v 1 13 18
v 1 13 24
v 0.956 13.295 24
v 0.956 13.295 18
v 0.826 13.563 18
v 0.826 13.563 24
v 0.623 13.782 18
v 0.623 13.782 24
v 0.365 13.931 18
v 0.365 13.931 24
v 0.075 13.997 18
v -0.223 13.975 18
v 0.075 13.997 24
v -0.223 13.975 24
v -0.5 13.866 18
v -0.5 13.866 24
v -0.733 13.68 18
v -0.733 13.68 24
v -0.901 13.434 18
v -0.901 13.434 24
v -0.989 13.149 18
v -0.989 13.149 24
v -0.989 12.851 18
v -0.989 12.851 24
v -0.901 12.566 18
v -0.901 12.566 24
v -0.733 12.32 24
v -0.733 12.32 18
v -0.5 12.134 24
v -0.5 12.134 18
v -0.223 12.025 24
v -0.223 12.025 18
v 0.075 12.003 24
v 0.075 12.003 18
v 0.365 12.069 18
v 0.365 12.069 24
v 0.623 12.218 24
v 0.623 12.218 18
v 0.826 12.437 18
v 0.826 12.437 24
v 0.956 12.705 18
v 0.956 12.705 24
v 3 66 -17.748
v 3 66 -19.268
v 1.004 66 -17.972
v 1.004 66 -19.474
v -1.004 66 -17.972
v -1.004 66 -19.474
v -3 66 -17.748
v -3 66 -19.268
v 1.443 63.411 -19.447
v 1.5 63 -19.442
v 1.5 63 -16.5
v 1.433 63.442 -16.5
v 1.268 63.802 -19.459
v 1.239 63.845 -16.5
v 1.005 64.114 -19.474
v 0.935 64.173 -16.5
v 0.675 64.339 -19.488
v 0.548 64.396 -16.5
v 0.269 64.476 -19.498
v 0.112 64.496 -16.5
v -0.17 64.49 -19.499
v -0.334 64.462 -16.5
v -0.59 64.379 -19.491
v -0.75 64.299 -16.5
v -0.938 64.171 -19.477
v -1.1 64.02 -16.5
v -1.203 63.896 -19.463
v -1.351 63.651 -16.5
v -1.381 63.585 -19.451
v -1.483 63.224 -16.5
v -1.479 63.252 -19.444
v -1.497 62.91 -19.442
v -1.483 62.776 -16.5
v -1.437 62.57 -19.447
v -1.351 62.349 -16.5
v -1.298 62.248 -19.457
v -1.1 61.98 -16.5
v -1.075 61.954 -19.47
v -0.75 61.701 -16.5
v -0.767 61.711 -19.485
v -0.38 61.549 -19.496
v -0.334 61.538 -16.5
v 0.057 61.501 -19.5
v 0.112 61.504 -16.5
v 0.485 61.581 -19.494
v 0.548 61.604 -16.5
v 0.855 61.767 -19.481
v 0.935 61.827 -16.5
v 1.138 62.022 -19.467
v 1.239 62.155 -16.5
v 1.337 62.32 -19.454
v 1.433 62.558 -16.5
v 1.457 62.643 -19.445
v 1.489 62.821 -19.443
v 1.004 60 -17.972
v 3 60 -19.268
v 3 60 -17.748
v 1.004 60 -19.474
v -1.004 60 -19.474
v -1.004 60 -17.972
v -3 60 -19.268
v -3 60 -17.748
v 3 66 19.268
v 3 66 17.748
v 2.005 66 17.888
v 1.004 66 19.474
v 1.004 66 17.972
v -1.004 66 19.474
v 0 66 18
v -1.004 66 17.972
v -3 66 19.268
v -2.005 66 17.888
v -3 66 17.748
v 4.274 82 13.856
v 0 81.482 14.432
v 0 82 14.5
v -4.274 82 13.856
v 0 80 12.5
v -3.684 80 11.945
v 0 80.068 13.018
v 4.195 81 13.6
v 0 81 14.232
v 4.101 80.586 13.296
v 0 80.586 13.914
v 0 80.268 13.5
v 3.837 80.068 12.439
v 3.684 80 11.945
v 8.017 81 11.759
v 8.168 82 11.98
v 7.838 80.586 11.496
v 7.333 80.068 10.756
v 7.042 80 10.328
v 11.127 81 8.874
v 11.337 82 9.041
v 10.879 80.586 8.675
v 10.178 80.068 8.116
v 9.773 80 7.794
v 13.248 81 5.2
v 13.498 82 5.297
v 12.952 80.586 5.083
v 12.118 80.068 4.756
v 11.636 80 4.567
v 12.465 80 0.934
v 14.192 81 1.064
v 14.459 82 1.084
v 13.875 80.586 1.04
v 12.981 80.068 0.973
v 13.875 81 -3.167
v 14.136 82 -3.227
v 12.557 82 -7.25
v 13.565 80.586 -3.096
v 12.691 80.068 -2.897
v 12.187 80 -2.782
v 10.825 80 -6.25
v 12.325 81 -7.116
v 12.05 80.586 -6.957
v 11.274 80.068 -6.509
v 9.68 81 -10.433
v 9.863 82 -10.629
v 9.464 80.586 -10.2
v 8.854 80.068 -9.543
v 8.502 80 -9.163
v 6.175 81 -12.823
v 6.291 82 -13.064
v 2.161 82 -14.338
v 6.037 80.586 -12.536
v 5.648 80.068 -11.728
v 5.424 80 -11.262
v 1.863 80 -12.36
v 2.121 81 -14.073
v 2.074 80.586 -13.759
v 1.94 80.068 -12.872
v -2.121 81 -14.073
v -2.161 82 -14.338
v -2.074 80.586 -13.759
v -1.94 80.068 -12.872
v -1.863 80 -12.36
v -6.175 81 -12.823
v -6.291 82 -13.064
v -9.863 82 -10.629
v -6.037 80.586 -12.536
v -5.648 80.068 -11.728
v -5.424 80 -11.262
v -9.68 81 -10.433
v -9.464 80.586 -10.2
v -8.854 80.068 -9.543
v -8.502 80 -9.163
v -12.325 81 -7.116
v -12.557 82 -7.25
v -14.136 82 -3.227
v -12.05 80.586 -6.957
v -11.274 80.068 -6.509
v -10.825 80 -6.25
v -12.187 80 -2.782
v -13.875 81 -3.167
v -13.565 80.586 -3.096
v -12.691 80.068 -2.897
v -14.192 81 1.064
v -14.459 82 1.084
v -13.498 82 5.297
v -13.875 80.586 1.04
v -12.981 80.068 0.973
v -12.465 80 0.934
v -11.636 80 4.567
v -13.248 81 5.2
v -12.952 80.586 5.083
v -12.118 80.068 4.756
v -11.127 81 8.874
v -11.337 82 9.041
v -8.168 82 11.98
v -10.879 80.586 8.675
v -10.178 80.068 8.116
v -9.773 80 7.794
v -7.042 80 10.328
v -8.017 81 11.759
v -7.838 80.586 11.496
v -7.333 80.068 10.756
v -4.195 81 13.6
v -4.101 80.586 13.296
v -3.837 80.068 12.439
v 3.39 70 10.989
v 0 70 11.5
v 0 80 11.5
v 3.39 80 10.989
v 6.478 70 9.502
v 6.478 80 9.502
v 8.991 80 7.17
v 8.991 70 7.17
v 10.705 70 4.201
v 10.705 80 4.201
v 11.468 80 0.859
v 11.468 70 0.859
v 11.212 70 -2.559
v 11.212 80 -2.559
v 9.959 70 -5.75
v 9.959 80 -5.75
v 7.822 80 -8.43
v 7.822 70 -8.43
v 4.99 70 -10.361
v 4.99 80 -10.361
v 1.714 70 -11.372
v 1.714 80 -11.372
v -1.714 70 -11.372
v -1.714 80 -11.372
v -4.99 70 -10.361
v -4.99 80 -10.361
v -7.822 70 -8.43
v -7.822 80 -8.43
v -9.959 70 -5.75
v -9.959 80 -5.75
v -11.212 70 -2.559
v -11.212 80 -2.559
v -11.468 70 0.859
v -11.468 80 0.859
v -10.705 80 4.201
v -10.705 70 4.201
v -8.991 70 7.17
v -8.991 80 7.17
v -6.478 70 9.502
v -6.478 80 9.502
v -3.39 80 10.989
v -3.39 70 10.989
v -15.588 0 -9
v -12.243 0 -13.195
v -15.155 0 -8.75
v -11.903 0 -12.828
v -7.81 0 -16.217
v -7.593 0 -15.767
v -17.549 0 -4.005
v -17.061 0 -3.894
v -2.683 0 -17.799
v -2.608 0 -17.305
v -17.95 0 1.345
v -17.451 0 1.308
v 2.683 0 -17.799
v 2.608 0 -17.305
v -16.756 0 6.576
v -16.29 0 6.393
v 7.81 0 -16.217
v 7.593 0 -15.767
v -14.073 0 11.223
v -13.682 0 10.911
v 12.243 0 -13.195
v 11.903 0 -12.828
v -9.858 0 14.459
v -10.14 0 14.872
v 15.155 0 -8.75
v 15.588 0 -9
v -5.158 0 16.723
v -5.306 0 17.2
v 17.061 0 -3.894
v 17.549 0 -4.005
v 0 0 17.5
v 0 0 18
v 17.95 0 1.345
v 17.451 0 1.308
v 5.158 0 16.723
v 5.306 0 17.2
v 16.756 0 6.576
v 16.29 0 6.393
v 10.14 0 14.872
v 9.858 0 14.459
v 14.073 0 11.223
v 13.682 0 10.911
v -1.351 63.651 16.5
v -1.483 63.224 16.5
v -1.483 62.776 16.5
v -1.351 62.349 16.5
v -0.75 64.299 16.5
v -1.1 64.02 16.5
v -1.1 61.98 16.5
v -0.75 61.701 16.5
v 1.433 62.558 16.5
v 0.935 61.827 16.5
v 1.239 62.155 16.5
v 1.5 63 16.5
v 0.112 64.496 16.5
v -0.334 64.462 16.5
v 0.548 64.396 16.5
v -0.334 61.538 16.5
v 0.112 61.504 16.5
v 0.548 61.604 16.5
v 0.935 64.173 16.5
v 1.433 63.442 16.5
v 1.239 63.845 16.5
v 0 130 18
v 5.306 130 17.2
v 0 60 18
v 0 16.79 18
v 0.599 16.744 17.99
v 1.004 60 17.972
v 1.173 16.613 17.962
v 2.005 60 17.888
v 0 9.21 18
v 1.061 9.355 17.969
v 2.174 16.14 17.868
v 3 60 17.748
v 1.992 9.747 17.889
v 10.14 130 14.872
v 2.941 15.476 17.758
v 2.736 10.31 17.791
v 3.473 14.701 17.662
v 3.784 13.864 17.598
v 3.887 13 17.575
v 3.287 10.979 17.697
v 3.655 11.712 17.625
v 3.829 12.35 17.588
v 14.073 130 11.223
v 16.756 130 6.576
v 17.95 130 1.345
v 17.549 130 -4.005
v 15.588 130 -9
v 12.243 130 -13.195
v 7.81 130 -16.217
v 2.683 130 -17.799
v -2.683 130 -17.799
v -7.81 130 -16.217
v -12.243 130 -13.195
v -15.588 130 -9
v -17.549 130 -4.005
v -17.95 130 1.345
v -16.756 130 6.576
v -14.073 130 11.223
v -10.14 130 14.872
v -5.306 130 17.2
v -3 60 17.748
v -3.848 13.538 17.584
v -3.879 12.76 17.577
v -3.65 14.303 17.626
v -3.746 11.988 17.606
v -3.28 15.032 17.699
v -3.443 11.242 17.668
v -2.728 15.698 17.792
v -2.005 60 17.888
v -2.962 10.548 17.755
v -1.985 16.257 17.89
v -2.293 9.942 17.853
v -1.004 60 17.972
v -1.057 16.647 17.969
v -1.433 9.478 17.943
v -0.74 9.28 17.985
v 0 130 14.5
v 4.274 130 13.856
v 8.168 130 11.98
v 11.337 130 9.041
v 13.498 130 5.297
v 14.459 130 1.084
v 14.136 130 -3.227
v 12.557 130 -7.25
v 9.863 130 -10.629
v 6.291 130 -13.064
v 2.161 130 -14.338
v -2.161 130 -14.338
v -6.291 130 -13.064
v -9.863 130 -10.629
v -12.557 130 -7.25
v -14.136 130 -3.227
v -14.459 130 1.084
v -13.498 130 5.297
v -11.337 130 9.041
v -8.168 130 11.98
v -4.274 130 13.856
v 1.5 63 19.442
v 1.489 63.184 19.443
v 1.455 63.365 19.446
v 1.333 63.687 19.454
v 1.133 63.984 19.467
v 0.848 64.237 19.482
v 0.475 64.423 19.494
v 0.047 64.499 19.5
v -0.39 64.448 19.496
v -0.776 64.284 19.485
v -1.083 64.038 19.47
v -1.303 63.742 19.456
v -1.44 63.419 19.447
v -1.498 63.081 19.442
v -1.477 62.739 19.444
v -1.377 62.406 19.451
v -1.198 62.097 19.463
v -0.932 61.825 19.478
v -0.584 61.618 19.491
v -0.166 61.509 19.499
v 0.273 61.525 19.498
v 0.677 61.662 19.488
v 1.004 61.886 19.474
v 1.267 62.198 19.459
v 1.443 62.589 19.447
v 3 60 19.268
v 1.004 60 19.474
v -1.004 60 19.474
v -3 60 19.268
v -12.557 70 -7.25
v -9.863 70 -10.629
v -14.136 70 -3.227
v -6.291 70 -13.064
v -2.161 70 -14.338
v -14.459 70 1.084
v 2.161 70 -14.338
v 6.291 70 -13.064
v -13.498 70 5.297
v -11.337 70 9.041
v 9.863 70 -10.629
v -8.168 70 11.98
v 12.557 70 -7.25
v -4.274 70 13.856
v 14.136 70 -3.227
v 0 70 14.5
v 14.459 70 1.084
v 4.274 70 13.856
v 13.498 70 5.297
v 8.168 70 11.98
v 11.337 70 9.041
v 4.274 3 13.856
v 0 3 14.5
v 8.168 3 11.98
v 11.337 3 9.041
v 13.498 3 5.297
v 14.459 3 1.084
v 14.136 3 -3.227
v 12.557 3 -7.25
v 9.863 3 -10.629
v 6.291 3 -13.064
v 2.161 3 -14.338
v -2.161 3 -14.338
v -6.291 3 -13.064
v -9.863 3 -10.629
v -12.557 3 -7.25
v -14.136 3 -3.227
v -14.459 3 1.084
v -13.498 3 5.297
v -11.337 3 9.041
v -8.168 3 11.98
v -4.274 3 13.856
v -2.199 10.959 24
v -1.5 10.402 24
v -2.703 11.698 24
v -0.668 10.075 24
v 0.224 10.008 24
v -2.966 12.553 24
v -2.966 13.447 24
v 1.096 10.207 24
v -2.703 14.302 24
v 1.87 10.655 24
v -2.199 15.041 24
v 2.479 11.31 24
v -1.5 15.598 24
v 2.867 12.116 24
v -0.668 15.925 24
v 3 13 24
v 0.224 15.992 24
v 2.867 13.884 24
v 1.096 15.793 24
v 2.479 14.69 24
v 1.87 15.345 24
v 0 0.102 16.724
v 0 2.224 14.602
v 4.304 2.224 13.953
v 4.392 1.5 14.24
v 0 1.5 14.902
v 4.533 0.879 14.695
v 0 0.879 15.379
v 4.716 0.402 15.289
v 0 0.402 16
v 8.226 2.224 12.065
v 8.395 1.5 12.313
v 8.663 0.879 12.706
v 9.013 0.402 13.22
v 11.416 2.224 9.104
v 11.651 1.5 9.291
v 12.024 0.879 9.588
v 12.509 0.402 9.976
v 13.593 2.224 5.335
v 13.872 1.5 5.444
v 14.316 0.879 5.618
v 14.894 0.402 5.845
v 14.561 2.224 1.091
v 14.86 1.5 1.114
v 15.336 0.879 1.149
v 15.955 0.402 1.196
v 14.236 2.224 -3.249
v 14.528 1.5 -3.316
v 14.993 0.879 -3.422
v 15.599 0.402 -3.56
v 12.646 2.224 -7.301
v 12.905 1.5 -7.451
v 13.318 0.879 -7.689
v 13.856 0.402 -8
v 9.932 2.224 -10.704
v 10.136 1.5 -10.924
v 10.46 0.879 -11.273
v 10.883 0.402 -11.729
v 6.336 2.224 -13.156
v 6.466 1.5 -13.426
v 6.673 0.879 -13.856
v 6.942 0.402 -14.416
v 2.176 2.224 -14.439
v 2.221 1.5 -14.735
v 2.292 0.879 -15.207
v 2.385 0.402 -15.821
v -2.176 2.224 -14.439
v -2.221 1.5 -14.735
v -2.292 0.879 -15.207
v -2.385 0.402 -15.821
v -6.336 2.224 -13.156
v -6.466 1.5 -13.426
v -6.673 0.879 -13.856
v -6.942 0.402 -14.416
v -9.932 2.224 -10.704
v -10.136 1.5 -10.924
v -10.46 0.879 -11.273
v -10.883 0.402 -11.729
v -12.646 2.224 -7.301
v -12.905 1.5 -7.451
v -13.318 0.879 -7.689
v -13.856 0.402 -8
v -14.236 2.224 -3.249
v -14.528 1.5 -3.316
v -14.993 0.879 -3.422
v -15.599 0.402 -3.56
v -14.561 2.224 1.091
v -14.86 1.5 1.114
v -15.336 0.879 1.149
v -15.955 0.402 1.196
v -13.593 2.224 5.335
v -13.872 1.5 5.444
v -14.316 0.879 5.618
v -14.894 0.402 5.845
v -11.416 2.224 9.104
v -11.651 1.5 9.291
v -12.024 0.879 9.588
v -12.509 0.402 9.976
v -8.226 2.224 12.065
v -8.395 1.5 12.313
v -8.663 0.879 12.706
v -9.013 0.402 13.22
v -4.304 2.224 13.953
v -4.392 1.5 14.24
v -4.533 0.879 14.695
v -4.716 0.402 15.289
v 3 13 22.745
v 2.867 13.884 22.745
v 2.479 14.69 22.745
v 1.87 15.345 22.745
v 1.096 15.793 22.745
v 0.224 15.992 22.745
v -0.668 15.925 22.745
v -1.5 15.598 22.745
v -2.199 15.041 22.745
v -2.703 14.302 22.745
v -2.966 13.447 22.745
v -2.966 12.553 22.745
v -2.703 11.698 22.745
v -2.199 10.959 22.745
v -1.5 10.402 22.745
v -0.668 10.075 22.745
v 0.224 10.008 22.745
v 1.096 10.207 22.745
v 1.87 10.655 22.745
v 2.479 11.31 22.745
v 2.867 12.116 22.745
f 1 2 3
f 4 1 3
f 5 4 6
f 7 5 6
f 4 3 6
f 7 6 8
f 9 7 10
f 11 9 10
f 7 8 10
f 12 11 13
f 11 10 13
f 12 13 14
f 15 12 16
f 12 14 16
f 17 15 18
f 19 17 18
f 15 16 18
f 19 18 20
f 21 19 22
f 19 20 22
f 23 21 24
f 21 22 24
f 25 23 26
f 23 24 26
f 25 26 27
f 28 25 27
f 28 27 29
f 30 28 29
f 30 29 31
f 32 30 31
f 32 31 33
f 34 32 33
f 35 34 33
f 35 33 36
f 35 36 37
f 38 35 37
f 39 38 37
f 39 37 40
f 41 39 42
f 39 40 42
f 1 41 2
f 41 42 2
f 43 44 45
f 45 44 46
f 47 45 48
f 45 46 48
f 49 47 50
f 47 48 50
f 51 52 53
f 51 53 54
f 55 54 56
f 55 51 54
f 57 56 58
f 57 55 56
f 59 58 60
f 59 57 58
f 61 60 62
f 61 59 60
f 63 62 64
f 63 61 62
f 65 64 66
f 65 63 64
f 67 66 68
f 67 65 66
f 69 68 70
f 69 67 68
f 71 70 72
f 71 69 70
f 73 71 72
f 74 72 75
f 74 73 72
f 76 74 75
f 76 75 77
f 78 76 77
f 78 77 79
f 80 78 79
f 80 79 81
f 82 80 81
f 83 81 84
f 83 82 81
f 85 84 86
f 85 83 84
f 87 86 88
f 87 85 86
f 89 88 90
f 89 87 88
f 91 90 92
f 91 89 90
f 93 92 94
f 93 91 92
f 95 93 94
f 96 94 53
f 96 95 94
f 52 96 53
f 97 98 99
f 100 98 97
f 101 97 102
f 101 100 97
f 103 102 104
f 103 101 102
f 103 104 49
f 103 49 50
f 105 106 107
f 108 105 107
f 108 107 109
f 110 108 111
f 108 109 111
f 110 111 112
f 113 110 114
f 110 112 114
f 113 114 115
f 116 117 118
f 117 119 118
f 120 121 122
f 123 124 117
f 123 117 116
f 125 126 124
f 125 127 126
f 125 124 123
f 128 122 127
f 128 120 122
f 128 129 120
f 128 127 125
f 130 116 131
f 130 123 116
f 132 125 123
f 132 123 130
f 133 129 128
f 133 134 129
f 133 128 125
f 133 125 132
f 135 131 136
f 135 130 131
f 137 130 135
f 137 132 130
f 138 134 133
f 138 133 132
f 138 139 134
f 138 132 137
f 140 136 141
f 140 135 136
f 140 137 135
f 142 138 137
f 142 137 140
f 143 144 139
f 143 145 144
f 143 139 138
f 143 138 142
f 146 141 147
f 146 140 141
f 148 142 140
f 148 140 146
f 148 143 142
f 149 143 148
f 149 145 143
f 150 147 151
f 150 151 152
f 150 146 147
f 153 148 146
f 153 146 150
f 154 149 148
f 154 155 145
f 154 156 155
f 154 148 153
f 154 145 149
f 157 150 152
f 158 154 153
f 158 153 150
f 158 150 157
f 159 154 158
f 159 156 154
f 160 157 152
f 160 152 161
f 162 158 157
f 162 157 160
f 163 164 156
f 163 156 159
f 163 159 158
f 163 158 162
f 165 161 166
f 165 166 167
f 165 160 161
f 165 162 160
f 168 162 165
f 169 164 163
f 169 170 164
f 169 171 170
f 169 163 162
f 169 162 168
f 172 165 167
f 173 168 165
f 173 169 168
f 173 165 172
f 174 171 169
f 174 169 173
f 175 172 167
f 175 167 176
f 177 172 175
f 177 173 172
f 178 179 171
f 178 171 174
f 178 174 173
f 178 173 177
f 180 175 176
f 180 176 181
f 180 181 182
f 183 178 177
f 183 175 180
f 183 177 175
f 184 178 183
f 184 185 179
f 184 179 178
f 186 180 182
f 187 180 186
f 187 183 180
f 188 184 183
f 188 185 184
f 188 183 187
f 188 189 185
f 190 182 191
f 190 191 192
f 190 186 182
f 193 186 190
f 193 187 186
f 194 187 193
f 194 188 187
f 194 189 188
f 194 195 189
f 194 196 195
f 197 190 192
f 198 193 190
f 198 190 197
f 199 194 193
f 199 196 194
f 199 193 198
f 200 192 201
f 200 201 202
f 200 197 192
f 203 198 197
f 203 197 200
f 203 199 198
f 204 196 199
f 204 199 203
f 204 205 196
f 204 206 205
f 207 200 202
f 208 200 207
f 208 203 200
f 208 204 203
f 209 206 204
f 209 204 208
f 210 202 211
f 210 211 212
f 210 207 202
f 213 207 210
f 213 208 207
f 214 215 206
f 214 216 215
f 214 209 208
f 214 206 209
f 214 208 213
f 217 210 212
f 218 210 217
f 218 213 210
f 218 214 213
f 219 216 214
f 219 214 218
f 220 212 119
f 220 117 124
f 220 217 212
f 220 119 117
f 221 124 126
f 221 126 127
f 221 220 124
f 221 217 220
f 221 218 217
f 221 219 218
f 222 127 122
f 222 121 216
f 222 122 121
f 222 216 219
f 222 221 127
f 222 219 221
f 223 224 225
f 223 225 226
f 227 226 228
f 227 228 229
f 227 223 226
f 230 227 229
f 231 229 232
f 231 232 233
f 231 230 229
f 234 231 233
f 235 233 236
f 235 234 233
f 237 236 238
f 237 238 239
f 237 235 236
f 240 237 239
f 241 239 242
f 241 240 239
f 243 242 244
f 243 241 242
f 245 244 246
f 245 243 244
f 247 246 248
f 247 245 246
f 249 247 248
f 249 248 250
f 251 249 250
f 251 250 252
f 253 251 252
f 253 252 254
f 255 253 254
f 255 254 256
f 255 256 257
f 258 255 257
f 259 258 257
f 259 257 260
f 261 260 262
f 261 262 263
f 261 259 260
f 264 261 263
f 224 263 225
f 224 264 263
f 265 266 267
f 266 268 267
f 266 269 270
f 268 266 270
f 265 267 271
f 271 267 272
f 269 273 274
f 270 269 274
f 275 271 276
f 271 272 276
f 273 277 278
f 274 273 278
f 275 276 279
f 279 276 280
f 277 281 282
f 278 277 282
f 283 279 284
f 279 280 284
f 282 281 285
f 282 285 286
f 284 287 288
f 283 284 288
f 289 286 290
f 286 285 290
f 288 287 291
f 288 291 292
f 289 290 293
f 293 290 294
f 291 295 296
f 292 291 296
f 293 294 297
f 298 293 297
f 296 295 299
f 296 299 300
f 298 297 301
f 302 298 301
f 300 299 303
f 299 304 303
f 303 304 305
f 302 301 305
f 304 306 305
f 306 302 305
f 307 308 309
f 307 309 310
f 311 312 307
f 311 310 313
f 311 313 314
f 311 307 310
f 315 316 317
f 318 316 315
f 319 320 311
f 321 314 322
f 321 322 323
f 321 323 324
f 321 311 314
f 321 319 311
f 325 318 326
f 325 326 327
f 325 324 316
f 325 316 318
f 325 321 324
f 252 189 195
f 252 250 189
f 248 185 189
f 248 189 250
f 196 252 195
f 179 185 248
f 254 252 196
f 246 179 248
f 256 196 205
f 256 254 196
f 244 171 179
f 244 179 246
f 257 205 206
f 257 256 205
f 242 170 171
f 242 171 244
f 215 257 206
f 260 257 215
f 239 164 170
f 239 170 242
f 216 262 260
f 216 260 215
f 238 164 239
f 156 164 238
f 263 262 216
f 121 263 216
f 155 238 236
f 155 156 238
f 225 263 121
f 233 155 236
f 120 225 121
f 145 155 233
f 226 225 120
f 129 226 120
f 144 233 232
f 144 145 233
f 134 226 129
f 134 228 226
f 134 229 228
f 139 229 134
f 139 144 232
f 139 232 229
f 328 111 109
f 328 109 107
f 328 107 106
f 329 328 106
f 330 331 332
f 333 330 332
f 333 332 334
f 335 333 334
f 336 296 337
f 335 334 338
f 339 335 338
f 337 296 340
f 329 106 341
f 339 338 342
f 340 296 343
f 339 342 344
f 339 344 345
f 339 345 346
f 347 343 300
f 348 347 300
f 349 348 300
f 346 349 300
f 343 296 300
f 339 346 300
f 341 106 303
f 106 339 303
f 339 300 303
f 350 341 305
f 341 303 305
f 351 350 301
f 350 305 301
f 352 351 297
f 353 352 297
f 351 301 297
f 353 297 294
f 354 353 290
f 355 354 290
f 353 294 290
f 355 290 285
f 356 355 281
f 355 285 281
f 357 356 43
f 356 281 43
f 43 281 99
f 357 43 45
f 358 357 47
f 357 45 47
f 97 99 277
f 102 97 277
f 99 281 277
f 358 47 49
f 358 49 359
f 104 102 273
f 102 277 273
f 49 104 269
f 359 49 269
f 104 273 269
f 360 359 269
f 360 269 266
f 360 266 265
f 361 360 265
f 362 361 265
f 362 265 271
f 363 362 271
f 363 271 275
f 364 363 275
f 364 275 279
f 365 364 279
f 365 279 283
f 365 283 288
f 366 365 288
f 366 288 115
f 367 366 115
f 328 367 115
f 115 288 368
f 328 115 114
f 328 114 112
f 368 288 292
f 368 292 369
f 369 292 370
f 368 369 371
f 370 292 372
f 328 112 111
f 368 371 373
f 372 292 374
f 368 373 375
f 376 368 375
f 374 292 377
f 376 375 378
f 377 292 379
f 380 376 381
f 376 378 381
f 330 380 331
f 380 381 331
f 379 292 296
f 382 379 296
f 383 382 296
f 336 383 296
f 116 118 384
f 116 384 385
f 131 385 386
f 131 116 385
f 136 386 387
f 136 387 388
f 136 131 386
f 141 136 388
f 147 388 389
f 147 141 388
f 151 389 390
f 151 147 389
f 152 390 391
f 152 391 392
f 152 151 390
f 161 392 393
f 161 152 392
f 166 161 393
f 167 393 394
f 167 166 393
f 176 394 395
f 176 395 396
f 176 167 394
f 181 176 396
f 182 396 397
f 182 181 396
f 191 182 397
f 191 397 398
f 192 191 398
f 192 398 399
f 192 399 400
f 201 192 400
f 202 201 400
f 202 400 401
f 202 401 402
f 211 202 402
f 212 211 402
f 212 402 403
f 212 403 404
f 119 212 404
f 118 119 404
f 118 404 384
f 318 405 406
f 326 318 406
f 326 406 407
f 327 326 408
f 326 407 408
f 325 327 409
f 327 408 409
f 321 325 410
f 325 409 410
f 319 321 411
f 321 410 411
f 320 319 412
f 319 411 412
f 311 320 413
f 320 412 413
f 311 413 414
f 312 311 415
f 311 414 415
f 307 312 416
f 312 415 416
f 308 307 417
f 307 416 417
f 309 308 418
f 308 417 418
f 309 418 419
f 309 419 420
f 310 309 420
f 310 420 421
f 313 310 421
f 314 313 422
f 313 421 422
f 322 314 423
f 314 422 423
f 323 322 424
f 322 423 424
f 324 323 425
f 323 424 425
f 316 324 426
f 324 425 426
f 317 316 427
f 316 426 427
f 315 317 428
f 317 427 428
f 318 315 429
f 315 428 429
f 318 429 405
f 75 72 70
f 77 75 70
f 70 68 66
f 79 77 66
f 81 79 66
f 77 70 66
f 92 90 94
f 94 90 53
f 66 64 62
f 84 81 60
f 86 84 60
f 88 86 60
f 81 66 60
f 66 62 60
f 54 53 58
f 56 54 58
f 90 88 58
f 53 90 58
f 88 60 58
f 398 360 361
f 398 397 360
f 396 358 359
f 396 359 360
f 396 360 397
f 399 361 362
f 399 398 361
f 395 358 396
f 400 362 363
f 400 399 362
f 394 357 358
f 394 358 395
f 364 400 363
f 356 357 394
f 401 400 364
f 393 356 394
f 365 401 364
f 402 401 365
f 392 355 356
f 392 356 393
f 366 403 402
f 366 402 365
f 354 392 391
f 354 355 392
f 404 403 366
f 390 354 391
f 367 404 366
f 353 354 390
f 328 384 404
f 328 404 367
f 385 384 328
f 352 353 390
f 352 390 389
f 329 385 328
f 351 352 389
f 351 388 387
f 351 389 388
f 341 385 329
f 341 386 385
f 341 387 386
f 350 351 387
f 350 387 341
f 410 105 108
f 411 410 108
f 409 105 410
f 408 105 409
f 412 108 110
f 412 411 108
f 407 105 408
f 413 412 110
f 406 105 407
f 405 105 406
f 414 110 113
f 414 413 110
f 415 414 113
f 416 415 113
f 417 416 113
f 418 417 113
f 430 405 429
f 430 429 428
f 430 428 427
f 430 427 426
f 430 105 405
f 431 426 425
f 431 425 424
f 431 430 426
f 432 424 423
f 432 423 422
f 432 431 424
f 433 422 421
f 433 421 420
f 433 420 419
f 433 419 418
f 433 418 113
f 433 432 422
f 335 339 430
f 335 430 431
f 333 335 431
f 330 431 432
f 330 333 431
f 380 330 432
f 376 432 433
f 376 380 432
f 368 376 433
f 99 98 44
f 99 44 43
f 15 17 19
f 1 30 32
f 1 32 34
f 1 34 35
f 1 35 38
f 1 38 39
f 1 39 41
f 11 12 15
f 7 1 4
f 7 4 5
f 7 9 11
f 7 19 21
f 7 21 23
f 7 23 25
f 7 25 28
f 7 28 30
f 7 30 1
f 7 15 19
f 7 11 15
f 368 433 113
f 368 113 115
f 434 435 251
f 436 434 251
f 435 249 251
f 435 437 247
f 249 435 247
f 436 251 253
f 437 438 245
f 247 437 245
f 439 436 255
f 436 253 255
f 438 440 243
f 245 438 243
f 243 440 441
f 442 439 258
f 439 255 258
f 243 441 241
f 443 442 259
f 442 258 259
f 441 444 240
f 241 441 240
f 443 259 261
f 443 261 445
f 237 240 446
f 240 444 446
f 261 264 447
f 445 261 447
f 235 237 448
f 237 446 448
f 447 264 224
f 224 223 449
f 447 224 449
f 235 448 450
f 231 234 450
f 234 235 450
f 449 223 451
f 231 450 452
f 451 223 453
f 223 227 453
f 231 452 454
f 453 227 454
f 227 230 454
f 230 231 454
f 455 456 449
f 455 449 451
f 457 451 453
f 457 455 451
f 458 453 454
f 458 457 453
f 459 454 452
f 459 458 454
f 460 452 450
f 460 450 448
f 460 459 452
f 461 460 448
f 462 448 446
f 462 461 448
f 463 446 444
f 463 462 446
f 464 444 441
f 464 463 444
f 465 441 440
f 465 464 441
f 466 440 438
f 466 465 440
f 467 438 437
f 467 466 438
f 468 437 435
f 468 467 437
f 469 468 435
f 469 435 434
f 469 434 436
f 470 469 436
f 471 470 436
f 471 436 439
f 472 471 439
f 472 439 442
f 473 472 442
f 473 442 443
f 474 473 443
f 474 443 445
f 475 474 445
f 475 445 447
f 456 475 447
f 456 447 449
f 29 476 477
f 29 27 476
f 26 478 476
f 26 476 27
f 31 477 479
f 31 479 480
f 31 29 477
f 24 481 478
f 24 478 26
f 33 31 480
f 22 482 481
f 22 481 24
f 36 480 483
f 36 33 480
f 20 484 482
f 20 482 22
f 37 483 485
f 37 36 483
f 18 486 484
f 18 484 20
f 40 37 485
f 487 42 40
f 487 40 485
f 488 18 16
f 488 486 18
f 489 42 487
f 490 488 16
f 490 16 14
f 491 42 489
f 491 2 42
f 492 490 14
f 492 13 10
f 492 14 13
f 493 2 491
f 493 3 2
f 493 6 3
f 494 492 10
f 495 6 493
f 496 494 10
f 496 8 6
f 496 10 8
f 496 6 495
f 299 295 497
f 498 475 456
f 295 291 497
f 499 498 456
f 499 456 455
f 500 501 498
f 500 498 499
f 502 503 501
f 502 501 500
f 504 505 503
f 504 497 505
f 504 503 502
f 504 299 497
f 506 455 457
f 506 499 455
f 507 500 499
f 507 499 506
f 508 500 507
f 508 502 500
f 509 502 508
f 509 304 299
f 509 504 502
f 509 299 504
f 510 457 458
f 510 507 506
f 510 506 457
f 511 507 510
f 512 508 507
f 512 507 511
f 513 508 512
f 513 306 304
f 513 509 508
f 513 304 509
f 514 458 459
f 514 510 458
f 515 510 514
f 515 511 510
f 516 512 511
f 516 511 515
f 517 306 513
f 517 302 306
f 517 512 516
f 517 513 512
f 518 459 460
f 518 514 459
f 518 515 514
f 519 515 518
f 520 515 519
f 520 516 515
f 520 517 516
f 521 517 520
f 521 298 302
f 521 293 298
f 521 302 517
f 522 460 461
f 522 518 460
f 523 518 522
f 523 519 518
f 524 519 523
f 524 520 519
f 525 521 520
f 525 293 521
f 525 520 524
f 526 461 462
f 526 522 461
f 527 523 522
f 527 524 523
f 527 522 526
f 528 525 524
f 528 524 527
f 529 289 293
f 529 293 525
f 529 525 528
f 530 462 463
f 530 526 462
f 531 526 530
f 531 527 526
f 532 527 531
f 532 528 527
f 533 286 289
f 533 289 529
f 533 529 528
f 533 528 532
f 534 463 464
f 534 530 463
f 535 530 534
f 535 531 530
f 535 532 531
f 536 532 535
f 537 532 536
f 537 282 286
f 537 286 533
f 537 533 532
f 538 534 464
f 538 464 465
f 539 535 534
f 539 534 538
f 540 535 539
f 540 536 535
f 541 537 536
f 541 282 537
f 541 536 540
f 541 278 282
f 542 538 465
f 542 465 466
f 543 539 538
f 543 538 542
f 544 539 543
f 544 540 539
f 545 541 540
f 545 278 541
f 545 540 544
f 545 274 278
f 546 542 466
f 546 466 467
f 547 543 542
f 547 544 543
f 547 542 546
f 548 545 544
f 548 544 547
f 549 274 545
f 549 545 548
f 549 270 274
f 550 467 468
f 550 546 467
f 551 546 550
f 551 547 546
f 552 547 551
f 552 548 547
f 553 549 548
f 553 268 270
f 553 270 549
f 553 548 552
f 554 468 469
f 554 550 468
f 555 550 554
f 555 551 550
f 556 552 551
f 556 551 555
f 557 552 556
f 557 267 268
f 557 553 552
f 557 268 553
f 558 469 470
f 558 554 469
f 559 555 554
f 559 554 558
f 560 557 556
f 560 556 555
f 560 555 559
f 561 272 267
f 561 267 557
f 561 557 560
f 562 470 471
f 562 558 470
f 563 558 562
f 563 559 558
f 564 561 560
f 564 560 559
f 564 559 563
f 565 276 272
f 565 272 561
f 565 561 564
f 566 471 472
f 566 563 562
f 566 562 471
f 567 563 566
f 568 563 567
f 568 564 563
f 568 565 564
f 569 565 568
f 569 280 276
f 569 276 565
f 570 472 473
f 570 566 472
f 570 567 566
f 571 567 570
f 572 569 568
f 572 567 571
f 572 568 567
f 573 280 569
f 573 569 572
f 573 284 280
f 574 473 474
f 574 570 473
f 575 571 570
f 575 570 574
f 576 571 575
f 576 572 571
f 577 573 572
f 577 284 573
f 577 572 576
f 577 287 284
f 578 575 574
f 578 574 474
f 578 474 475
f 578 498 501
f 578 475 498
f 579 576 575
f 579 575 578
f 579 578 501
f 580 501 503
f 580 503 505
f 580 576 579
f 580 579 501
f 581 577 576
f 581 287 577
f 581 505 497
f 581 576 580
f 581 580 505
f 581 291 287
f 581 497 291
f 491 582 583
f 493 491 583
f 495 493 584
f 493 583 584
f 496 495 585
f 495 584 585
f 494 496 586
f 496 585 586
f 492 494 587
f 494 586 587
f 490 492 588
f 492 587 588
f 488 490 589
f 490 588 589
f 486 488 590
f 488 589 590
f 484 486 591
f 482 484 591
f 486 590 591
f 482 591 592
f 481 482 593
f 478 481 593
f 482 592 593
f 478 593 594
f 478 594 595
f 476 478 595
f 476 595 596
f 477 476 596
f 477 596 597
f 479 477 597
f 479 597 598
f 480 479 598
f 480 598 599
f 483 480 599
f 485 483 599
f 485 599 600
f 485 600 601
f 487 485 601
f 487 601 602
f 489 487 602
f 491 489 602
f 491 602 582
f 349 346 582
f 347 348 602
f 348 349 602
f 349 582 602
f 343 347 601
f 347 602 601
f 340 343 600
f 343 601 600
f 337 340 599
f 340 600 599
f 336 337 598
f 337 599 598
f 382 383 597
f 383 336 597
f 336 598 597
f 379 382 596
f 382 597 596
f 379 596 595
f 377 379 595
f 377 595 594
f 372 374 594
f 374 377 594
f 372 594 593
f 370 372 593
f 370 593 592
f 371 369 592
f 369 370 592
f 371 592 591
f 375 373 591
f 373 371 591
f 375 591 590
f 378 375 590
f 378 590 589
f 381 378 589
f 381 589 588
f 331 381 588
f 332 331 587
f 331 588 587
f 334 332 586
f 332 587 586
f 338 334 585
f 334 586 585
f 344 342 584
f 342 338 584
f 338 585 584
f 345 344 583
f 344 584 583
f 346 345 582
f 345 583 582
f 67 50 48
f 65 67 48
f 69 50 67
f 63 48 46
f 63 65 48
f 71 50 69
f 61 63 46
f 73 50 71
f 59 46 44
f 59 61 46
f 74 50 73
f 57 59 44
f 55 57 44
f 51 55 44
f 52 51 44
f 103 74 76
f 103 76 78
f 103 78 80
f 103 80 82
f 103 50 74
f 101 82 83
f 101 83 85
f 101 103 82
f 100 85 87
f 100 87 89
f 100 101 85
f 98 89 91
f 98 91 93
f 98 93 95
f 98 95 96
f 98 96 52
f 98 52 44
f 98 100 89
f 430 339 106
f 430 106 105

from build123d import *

# Parameters (mm, degrees)
SKETCH1_R                = 18
SKETCH1_R_2              = 14.5
BOSS_EXTRUDE1_DEPTH      = 130
FILLET1_R                = 3
BOSS_EXTRUDE2_DEPTH      = 6
SKETCH4_R                = 1.5
CUT_EXTRUDE1_DEPTH       = 1.5
BOSS_EXTRUDE3_DEPTH      = 6
BOSS_EXTRUDE3_DEPTH_BACK = 1
SKETCH5_R                = 3
SKETCH7_R                = 1
CUT_EXTRUDE2_DEPTH       = 6
SKETCH8_R                = 14.5
SKETCH8_R_2              = 11.5
BOSS_EXTRUDE4_DEPTH      = 10
FILLET2_R                = 2


with BuildPart() as part:
    # Sketch1 → Boss-Extrude1 (new body)
    with BuildSketch(Plane(origin=(0, 0, 0), x_dir=(1, 0, 0), z_dir=(0, 1, 0))):
        Circle(SKETCH1_R)
        Circle(SKETCH1_R_2, mode=Mode.SUBTRACT)
    extrude(amount=BOSS_EXTRUDE1_DEPTH)

    # Fillet1
    fillet1_edges = [part.edges().sort_by_distance(p)[0] for p in [
        (-14.5, 0, 0),
    ]]
    fillet(fillet1_edges, radius=FILLET1_R)

    # Sketch3 → Boss-Extrude2 (add)
    with BuildSketch(Plane(origin=(0, 60, 0), x_dir=(1, 0, 0), z_dir=(0, 1, 0))):
        with BuildLine():
            Line((-3, -19.267848868), (-3, -17.748239349))
            ThreePointArc((-3, -17.748239349), (0, -18), (3, -17.748239349))
            Line((3, -17.748239349), (3, -19.267848868))
            ThreePointArc((3, -19.267848868), (0, -19.5), (-3, -19.267848868))
        make_face()
        with BuildLine():
            Line((3, 19.267848868), (3, 17.748239349))
            ThreePointArc((3, 17.748239349), (0, 18), (-3, 17.748239349))
            Line((-3, 17.748239349), (-3, 19.267848868))
            ThreePointArc((-3, 19.267848868), (0, 19.5), (3, 19.267848868))
        make_face()
    extrude(amount=BOSS_EXTRUDE2_DEPTH)

    # Sketch4 → Cut-Extrude1 (cut, symmetric)
    with BuildSketch(Plane.XY.offset(18)):
        with Locations((0, 63)):
            Circle(SKETCH4_R)
    cut_extrude1 = extrude(amount=CUT_EXTRUDE1_DEPTH, both=True, mode=Mode.SUBTRACT)

    # Mirror1: Cut-Extrude1 across plane
    add(cut_extrude1.mirror(Plane.XY), mode=Mode.SUBTRACT)



with BuildPart() as body_2:
    # Sketch5 → Boss-Extrude3 (new, two sides: drawn at the far end of the back side and taken through both)
    with BuildSketch(Plane.XY.offset(18).offset(-BOSS_EXTRUDE3_DEPTH_BACK)):
        with Locations((0, 13)):
            Circle(SKETCH5_R)
    extrude(amount=BOSS_EXTRUDE3_DEPTH + BOSS_EXTRUDE3_DEPTH_BACK)


with BuildPart() as part_1:
    add(part.part)

    add(body_2.part)  # Revolve1 merges body 2
    # Sketch6 → Revolve1 (revolve)
    with BuildSketch(Plane(origin=(0, 0, 0), x_dir=(0, 0, -1), z_dir=(1, 0, 0))):
        with BuildLine():
            Line((-22.744590516, 16), (-22.744590516, 13))
            Line((-22.744590516, 13), (-16.500678741, 13))
            Line((-16.500678741, 13), (-16.500678741, 17.154644063))
            add(Edge.make_bspline(
                [(-16.500678741, 17.154644063), (-18.548555394, 16.616818558), (-20.629859319, 16.231937203), (-22.744590516, 16)],
                knots=[0.47611858, 0.47611858, 0.47611858, 0.47611858, 1, 1, 1, 1], degree=3))
        make_face()
    revolve(axis=Axis((0, 13, 22.744590516), (0, 0, -1)))

    # Sketch7 → Cut-Extrude2 (cut)
    with BuildSketch(Plane.XY.offset(24)):
        with Locations((0, 13)):
            Circle(SKETCH7_R)
    extrude(amount=-CUT_EXTRUDE2_DEPTH, mode=Mode.SUBTRACT)

    # Sketch8 → Boss-Extrude4 (add)
    with BuildSketch(Plane(origin=(0, 70, 0), x_dir=(1, 0, 0), z_dir=(0, 1, 0))):
        Circle(SKETCH8_R)
        Circle(SKETCH8_R_2, mode=Mode.SUBTRACT)
    extrude(amount=BOSS_EXTRUDE4_DEPTH)

    # Fillet2
    fillet2_edges = [part_1.edges().sort_by_distance(p)[0] for p in [
        (-14.5, 80, 0),
    ]]
    fillet(fillet2_edges, radius=FILLET2_R)


solid = part_1.part
